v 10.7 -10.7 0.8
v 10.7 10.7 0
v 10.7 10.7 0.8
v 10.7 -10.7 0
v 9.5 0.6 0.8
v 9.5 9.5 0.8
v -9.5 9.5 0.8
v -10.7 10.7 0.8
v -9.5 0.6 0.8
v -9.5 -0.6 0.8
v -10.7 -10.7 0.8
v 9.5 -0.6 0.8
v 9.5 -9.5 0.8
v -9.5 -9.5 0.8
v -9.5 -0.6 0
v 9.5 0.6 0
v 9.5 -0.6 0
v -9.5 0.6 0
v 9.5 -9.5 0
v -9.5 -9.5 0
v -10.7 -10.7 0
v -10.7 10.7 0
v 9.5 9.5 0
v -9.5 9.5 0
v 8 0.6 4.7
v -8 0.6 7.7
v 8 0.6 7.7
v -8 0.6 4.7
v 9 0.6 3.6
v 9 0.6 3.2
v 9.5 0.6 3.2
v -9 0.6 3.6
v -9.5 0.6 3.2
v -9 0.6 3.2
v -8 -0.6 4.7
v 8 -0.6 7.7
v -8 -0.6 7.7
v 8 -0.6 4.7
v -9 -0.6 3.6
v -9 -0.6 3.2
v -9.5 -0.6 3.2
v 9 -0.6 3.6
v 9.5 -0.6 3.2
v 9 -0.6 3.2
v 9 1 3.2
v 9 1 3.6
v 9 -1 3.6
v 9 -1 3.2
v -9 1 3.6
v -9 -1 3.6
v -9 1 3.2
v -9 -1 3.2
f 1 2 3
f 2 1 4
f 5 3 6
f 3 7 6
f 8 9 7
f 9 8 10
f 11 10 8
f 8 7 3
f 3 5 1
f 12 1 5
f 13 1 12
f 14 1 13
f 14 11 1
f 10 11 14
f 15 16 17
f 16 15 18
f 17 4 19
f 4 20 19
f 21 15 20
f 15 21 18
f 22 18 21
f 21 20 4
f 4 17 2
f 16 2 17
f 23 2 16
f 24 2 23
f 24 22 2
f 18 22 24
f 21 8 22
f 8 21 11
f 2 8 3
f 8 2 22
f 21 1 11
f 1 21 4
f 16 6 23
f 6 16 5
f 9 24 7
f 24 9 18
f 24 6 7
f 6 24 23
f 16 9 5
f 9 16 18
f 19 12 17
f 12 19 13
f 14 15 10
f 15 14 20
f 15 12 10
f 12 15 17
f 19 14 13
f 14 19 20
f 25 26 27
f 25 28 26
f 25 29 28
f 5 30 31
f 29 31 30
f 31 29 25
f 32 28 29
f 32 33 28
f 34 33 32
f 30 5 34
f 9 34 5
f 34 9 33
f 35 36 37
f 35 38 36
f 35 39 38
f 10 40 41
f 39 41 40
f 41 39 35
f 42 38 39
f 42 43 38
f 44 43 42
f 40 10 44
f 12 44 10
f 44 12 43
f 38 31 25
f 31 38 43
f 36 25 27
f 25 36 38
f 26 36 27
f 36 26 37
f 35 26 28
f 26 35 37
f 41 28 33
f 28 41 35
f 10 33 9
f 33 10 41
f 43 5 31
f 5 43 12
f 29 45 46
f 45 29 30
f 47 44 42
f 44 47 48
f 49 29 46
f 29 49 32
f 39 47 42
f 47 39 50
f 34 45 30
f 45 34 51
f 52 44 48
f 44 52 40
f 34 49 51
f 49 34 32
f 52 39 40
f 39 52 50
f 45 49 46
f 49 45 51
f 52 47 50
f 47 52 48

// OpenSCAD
// Master caution light baffle for 33mm arcade switch

module baffle(){

difference(){
  union(){
  // Front face
  translate([-21.4/2,-21.4/2,0])
  cube([21.4,21.4,0.8]);
  }
  // Top aperture
  translate([(-21.4/2)+1.2,0.6,0])
  cube([21.4-2.4,(21.4/2)-1.2-0.6,6]);
  // Bottom aperture
  translate([(-21.4/2)+1.2,(-21.4/2)+1.2,0])
  cube([21.4-2.4,(21.4/2)-1.2-0.6,6]); 
}


// Baffle (2D shape on XY plane)
translate([0,0.6,0.8])
rotate([90,0,0])
linear_extrude(1.2){
polygon(points=[
[19/2,0],
[19/2,2.4],
[16/2,2.4+1.5],
[16/2,2.4+1.5+3],
//[10.8/2,2.4+1.5+10],
//[10.8/2,2.4+1.5+10+2.2],

//[-10.8/2,2.4+1.5+10+2.2],
//[-10.8/2,2.4+1.5+10],
[-16/2,2.4+1.5+3],
[-16/2,2.4+1.5],
[-19/2,2.4],
[-19/2,0],

]);
}

// Rib for inset
translate([-18/2,-1,3.2])
cube([18,2,0.4]);

}

baffle();
